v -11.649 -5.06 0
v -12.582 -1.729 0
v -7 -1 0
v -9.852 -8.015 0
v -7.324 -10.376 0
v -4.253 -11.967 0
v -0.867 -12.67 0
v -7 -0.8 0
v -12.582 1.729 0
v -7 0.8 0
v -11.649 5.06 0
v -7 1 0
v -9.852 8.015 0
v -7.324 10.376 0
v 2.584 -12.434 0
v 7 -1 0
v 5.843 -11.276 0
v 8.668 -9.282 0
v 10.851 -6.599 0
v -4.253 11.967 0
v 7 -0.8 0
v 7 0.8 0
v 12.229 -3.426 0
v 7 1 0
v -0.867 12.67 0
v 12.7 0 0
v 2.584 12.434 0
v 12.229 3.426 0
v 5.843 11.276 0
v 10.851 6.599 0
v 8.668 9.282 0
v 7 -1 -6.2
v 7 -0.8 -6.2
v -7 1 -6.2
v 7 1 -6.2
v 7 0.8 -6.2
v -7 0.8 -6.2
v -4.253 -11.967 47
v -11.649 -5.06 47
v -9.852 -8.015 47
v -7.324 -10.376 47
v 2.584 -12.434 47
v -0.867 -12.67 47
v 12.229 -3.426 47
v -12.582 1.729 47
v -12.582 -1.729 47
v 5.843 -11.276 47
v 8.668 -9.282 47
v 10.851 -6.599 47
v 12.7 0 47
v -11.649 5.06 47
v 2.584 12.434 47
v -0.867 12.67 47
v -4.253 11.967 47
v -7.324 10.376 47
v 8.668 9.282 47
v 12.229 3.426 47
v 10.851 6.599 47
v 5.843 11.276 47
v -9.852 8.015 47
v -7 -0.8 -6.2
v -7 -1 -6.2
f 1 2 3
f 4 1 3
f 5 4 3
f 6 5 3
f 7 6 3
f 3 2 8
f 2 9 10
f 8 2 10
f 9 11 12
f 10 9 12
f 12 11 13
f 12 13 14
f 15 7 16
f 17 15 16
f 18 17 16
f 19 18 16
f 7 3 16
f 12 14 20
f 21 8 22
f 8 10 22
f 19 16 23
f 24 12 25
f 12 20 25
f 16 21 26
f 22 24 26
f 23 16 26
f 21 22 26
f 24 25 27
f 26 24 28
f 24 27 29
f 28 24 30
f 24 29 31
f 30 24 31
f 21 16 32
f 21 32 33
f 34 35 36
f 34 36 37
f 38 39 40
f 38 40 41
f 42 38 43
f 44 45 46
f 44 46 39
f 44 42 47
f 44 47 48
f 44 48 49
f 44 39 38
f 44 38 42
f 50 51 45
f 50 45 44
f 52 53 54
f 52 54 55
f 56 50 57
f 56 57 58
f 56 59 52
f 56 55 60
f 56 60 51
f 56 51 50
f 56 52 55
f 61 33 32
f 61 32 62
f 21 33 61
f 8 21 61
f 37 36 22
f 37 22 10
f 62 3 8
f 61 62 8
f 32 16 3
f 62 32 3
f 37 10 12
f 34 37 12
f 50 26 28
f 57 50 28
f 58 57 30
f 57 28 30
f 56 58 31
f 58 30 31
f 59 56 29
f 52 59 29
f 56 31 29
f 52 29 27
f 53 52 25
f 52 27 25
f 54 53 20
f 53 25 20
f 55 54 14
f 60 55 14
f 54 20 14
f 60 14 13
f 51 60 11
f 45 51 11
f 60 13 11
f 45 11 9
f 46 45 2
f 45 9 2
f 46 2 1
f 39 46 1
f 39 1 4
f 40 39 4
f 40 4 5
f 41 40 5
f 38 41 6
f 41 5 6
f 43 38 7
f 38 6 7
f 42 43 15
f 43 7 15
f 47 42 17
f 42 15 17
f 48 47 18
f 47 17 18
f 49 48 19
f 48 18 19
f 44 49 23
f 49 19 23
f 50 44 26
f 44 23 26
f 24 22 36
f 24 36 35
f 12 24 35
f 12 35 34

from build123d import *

# Parameters (mm, degrees)
SKETCH1_R           = 12.7
BOSS_EXTRUDE1_DEPTH = 47
SKETCH2_W           = 14
SKETCH2_H           = 2
BOSS_EXTRUDE2_DEPTH = 6.2
SKETCH3_W           = 14
SKETCH3_H           = 1.6
CUT_EXTRUDE1_DEPTH  = 6.2


with BuildPart() as part:
    # Sketch1 → Boss-Extrude1 (new body)
    with BuildSketch(Plane.XY):
        Circle(SKETCH1_R)
    extrude(amount=BOSS_EXTRUDE1_DEPTH)

    # Sketch2 → Boss-Extrude2 (add)
    with BuildSketch(Plane(origin=(0, 0, 0), x_dir=(-1, 0, 0), z_dir=(0, 0, -1))):
        Rectangle(SKETCH2_W, SKETCH2_H)
    extrude(amount=BOSS_EXTRUDE2_DEPTH)

    # Sketch3 → Cut-Extrude1 (cut)
    with BuildSketch(Plane(origin=(0, 0, -6.2), x_dir=(-1, 0, 0), z_dir=(0, 0, -1))):
        Rectangle(SKETCH3_W, SKETCH3_H)
    extrude(amount=-CUT_EXTRUDE1_DEPTH, mode=Mode.SUBTRACT)


solid = part.part
